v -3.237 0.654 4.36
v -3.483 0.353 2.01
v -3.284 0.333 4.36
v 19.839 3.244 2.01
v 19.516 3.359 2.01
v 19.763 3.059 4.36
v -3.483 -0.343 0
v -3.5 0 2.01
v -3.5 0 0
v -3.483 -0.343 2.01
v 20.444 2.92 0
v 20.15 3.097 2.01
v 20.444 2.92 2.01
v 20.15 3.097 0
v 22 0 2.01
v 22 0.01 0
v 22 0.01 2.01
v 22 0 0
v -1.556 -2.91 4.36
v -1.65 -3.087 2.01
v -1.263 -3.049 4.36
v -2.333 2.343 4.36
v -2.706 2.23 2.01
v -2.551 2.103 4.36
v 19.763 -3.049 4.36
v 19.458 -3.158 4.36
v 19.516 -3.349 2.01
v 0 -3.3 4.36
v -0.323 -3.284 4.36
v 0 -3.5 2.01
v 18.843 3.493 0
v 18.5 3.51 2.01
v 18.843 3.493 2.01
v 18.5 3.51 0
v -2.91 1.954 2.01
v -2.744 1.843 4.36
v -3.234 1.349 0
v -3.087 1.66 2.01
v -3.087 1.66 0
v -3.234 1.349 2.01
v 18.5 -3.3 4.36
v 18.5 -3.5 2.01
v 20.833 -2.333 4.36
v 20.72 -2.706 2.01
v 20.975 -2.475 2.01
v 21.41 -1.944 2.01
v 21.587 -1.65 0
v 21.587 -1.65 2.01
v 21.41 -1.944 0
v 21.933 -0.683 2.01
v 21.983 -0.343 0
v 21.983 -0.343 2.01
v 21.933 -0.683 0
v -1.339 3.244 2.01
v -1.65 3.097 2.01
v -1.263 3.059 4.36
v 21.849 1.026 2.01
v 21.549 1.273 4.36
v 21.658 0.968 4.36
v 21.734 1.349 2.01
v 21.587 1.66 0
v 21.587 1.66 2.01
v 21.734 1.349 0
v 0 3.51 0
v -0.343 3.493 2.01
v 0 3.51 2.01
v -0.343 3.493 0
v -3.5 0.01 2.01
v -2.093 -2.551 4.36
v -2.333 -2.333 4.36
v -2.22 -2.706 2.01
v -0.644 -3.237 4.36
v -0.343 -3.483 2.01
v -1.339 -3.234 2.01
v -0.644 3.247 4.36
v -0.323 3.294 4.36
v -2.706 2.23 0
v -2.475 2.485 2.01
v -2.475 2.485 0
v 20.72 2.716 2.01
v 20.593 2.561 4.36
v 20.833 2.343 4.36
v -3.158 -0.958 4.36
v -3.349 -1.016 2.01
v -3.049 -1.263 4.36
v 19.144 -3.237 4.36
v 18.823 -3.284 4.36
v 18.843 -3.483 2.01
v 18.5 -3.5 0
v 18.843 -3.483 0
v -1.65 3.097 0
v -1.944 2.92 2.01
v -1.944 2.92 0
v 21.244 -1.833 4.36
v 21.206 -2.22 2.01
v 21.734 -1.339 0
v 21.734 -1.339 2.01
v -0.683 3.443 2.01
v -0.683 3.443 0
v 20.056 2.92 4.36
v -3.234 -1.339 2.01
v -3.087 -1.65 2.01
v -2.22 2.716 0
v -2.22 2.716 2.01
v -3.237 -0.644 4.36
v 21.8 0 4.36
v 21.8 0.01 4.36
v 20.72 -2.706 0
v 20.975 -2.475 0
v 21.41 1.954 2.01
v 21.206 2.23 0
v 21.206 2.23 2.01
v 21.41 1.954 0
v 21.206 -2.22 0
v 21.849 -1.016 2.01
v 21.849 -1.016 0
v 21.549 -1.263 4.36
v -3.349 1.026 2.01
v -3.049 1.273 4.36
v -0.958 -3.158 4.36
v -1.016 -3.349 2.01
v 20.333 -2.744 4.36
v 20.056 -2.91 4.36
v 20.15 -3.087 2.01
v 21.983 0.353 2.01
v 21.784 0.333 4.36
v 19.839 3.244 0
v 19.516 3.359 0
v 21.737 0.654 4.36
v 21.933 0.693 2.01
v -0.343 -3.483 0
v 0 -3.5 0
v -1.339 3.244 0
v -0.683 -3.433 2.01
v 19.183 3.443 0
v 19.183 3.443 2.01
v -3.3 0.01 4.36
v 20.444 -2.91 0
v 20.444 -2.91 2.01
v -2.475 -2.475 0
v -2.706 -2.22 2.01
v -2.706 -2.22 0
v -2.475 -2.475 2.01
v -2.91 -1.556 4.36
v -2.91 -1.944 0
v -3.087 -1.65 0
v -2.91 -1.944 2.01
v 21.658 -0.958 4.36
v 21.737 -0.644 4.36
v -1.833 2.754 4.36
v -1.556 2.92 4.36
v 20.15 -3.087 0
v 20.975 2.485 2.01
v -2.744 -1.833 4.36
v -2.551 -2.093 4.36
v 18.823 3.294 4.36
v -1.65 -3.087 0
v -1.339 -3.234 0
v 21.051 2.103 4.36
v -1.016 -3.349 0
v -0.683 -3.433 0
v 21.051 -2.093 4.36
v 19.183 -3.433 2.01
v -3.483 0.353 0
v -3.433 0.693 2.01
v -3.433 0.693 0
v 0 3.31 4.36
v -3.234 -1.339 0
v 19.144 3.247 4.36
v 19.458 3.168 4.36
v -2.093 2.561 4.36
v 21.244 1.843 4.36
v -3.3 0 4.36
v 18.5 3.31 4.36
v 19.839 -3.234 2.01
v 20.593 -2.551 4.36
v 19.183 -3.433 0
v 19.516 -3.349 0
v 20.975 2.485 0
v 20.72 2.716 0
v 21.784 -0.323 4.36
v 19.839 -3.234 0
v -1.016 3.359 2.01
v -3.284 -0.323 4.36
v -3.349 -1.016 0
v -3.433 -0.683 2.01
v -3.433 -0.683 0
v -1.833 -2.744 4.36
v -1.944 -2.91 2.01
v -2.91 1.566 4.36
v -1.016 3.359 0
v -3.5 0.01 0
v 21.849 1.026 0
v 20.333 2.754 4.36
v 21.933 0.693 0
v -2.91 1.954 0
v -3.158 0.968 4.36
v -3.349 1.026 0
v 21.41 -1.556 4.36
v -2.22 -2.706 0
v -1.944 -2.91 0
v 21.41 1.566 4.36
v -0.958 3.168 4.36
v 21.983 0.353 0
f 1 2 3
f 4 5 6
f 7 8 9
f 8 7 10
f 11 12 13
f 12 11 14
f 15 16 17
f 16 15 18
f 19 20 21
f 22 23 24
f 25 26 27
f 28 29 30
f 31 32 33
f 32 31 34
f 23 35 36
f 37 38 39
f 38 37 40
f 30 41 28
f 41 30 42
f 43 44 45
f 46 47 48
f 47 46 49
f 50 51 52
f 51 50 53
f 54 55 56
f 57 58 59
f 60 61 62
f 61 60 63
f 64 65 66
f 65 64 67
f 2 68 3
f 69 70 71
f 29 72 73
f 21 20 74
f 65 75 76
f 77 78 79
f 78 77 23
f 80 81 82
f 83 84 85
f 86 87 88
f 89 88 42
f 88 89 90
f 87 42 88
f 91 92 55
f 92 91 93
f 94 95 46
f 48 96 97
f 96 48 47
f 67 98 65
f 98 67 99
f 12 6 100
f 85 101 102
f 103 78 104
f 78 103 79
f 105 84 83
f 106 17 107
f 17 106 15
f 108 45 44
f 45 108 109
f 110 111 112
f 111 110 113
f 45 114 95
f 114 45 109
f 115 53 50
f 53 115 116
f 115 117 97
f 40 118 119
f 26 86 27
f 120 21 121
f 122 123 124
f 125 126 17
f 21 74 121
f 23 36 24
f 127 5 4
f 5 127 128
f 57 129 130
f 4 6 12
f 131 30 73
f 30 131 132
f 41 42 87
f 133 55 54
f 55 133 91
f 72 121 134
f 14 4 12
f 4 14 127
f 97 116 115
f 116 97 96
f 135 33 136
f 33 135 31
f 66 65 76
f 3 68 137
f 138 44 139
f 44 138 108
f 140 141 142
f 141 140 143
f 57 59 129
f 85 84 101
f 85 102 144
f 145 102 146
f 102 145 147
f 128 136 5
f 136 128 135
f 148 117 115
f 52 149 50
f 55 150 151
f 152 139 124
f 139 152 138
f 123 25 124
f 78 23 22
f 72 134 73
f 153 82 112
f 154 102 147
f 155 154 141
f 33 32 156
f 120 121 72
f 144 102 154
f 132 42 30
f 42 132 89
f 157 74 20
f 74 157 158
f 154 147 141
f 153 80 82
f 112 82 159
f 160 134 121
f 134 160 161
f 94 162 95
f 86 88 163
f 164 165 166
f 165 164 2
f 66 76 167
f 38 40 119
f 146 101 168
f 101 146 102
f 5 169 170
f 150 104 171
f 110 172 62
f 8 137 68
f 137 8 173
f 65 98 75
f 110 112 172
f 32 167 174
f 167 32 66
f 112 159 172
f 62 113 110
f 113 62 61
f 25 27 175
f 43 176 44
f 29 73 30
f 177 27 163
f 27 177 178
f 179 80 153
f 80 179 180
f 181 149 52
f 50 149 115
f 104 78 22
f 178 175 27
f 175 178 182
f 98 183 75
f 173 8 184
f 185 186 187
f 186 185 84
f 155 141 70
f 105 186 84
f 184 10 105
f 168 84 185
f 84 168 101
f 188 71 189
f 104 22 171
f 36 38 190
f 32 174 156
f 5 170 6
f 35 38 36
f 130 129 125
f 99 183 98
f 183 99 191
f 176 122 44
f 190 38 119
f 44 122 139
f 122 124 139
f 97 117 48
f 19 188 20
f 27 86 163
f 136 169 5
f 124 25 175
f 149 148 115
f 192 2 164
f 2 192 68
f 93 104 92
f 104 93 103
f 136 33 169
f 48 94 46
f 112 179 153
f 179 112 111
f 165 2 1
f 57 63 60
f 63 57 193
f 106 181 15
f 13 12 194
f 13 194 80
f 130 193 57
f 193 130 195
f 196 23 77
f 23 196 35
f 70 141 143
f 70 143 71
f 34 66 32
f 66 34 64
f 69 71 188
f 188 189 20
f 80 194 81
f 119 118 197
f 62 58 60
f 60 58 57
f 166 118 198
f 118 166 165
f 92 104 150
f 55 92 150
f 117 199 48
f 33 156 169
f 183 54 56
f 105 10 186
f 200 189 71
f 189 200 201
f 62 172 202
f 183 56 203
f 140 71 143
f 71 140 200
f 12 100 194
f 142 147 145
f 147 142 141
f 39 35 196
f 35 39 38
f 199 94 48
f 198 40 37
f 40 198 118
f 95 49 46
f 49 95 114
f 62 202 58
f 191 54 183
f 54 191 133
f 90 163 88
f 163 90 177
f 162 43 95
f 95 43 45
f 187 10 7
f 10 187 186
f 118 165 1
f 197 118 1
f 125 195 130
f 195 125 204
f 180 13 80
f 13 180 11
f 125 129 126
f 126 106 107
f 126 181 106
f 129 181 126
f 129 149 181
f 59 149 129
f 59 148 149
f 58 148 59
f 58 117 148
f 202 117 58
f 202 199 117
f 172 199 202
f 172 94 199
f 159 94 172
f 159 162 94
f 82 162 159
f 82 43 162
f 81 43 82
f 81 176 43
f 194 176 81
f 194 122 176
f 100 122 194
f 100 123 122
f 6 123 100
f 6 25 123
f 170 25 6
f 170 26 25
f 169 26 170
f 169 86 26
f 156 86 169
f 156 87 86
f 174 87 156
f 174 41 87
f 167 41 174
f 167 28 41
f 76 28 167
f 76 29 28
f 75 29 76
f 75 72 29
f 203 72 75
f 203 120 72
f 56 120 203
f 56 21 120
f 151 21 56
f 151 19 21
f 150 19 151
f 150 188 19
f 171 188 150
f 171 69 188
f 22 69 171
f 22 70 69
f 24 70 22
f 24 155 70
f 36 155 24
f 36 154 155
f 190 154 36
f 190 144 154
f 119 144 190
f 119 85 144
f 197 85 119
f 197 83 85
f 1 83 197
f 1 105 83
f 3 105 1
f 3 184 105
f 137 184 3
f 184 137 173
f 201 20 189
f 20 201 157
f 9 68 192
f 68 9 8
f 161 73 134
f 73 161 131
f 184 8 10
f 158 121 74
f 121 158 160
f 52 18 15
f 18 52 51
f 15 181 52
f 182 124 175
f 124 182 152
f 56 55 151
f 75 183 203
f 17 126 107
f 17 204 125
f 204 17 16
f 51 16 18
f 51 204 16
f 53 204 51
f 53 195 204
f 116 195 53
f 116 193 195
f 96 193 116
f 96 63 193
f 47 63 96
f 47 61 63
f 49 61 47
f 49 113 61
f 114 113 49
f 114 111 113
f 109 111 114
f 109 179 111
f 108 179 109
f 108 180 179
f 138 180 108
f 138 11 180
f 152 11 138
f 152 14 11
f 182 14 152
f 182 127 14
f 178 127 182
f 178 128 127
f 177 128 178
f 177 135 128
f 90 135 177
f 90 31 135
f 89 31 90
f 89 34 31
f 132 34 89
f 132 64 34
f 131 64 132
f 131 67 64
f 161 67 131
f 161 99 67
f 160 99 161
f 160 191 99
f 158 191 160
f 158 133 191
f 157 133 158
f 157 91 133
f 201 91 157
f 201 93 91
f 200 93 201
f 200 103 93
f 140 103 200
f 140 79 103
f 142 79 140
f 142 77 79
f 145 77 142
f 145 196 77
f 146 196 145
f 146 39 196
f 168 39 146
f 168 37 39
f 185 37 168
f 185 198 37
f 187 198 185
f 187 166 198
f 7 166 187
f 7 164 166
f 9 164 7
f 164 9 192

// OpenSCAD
// Replacement Laptop Foot

$fn = 64;

taper = 0.2;
foot_slot_depth = 2.0;
foot_h = 4.35-foot_slot_depth;
foot_w = 25.5; 
foot_l = 7.0;
union() {
translate([0,0,foot_slot_depth])
minkowski() {
cylinder(foot_h, foot_l/2, foot_l/2-taper);
cube([foot_w-foot_l, 0.01, 0.01]);
}
minkowski() {
cylinder(foot_slot_depth, foot_l/2, foot_l/2);
cube([foot_w-foot_l, 0.01, 0.01]);
}
}
